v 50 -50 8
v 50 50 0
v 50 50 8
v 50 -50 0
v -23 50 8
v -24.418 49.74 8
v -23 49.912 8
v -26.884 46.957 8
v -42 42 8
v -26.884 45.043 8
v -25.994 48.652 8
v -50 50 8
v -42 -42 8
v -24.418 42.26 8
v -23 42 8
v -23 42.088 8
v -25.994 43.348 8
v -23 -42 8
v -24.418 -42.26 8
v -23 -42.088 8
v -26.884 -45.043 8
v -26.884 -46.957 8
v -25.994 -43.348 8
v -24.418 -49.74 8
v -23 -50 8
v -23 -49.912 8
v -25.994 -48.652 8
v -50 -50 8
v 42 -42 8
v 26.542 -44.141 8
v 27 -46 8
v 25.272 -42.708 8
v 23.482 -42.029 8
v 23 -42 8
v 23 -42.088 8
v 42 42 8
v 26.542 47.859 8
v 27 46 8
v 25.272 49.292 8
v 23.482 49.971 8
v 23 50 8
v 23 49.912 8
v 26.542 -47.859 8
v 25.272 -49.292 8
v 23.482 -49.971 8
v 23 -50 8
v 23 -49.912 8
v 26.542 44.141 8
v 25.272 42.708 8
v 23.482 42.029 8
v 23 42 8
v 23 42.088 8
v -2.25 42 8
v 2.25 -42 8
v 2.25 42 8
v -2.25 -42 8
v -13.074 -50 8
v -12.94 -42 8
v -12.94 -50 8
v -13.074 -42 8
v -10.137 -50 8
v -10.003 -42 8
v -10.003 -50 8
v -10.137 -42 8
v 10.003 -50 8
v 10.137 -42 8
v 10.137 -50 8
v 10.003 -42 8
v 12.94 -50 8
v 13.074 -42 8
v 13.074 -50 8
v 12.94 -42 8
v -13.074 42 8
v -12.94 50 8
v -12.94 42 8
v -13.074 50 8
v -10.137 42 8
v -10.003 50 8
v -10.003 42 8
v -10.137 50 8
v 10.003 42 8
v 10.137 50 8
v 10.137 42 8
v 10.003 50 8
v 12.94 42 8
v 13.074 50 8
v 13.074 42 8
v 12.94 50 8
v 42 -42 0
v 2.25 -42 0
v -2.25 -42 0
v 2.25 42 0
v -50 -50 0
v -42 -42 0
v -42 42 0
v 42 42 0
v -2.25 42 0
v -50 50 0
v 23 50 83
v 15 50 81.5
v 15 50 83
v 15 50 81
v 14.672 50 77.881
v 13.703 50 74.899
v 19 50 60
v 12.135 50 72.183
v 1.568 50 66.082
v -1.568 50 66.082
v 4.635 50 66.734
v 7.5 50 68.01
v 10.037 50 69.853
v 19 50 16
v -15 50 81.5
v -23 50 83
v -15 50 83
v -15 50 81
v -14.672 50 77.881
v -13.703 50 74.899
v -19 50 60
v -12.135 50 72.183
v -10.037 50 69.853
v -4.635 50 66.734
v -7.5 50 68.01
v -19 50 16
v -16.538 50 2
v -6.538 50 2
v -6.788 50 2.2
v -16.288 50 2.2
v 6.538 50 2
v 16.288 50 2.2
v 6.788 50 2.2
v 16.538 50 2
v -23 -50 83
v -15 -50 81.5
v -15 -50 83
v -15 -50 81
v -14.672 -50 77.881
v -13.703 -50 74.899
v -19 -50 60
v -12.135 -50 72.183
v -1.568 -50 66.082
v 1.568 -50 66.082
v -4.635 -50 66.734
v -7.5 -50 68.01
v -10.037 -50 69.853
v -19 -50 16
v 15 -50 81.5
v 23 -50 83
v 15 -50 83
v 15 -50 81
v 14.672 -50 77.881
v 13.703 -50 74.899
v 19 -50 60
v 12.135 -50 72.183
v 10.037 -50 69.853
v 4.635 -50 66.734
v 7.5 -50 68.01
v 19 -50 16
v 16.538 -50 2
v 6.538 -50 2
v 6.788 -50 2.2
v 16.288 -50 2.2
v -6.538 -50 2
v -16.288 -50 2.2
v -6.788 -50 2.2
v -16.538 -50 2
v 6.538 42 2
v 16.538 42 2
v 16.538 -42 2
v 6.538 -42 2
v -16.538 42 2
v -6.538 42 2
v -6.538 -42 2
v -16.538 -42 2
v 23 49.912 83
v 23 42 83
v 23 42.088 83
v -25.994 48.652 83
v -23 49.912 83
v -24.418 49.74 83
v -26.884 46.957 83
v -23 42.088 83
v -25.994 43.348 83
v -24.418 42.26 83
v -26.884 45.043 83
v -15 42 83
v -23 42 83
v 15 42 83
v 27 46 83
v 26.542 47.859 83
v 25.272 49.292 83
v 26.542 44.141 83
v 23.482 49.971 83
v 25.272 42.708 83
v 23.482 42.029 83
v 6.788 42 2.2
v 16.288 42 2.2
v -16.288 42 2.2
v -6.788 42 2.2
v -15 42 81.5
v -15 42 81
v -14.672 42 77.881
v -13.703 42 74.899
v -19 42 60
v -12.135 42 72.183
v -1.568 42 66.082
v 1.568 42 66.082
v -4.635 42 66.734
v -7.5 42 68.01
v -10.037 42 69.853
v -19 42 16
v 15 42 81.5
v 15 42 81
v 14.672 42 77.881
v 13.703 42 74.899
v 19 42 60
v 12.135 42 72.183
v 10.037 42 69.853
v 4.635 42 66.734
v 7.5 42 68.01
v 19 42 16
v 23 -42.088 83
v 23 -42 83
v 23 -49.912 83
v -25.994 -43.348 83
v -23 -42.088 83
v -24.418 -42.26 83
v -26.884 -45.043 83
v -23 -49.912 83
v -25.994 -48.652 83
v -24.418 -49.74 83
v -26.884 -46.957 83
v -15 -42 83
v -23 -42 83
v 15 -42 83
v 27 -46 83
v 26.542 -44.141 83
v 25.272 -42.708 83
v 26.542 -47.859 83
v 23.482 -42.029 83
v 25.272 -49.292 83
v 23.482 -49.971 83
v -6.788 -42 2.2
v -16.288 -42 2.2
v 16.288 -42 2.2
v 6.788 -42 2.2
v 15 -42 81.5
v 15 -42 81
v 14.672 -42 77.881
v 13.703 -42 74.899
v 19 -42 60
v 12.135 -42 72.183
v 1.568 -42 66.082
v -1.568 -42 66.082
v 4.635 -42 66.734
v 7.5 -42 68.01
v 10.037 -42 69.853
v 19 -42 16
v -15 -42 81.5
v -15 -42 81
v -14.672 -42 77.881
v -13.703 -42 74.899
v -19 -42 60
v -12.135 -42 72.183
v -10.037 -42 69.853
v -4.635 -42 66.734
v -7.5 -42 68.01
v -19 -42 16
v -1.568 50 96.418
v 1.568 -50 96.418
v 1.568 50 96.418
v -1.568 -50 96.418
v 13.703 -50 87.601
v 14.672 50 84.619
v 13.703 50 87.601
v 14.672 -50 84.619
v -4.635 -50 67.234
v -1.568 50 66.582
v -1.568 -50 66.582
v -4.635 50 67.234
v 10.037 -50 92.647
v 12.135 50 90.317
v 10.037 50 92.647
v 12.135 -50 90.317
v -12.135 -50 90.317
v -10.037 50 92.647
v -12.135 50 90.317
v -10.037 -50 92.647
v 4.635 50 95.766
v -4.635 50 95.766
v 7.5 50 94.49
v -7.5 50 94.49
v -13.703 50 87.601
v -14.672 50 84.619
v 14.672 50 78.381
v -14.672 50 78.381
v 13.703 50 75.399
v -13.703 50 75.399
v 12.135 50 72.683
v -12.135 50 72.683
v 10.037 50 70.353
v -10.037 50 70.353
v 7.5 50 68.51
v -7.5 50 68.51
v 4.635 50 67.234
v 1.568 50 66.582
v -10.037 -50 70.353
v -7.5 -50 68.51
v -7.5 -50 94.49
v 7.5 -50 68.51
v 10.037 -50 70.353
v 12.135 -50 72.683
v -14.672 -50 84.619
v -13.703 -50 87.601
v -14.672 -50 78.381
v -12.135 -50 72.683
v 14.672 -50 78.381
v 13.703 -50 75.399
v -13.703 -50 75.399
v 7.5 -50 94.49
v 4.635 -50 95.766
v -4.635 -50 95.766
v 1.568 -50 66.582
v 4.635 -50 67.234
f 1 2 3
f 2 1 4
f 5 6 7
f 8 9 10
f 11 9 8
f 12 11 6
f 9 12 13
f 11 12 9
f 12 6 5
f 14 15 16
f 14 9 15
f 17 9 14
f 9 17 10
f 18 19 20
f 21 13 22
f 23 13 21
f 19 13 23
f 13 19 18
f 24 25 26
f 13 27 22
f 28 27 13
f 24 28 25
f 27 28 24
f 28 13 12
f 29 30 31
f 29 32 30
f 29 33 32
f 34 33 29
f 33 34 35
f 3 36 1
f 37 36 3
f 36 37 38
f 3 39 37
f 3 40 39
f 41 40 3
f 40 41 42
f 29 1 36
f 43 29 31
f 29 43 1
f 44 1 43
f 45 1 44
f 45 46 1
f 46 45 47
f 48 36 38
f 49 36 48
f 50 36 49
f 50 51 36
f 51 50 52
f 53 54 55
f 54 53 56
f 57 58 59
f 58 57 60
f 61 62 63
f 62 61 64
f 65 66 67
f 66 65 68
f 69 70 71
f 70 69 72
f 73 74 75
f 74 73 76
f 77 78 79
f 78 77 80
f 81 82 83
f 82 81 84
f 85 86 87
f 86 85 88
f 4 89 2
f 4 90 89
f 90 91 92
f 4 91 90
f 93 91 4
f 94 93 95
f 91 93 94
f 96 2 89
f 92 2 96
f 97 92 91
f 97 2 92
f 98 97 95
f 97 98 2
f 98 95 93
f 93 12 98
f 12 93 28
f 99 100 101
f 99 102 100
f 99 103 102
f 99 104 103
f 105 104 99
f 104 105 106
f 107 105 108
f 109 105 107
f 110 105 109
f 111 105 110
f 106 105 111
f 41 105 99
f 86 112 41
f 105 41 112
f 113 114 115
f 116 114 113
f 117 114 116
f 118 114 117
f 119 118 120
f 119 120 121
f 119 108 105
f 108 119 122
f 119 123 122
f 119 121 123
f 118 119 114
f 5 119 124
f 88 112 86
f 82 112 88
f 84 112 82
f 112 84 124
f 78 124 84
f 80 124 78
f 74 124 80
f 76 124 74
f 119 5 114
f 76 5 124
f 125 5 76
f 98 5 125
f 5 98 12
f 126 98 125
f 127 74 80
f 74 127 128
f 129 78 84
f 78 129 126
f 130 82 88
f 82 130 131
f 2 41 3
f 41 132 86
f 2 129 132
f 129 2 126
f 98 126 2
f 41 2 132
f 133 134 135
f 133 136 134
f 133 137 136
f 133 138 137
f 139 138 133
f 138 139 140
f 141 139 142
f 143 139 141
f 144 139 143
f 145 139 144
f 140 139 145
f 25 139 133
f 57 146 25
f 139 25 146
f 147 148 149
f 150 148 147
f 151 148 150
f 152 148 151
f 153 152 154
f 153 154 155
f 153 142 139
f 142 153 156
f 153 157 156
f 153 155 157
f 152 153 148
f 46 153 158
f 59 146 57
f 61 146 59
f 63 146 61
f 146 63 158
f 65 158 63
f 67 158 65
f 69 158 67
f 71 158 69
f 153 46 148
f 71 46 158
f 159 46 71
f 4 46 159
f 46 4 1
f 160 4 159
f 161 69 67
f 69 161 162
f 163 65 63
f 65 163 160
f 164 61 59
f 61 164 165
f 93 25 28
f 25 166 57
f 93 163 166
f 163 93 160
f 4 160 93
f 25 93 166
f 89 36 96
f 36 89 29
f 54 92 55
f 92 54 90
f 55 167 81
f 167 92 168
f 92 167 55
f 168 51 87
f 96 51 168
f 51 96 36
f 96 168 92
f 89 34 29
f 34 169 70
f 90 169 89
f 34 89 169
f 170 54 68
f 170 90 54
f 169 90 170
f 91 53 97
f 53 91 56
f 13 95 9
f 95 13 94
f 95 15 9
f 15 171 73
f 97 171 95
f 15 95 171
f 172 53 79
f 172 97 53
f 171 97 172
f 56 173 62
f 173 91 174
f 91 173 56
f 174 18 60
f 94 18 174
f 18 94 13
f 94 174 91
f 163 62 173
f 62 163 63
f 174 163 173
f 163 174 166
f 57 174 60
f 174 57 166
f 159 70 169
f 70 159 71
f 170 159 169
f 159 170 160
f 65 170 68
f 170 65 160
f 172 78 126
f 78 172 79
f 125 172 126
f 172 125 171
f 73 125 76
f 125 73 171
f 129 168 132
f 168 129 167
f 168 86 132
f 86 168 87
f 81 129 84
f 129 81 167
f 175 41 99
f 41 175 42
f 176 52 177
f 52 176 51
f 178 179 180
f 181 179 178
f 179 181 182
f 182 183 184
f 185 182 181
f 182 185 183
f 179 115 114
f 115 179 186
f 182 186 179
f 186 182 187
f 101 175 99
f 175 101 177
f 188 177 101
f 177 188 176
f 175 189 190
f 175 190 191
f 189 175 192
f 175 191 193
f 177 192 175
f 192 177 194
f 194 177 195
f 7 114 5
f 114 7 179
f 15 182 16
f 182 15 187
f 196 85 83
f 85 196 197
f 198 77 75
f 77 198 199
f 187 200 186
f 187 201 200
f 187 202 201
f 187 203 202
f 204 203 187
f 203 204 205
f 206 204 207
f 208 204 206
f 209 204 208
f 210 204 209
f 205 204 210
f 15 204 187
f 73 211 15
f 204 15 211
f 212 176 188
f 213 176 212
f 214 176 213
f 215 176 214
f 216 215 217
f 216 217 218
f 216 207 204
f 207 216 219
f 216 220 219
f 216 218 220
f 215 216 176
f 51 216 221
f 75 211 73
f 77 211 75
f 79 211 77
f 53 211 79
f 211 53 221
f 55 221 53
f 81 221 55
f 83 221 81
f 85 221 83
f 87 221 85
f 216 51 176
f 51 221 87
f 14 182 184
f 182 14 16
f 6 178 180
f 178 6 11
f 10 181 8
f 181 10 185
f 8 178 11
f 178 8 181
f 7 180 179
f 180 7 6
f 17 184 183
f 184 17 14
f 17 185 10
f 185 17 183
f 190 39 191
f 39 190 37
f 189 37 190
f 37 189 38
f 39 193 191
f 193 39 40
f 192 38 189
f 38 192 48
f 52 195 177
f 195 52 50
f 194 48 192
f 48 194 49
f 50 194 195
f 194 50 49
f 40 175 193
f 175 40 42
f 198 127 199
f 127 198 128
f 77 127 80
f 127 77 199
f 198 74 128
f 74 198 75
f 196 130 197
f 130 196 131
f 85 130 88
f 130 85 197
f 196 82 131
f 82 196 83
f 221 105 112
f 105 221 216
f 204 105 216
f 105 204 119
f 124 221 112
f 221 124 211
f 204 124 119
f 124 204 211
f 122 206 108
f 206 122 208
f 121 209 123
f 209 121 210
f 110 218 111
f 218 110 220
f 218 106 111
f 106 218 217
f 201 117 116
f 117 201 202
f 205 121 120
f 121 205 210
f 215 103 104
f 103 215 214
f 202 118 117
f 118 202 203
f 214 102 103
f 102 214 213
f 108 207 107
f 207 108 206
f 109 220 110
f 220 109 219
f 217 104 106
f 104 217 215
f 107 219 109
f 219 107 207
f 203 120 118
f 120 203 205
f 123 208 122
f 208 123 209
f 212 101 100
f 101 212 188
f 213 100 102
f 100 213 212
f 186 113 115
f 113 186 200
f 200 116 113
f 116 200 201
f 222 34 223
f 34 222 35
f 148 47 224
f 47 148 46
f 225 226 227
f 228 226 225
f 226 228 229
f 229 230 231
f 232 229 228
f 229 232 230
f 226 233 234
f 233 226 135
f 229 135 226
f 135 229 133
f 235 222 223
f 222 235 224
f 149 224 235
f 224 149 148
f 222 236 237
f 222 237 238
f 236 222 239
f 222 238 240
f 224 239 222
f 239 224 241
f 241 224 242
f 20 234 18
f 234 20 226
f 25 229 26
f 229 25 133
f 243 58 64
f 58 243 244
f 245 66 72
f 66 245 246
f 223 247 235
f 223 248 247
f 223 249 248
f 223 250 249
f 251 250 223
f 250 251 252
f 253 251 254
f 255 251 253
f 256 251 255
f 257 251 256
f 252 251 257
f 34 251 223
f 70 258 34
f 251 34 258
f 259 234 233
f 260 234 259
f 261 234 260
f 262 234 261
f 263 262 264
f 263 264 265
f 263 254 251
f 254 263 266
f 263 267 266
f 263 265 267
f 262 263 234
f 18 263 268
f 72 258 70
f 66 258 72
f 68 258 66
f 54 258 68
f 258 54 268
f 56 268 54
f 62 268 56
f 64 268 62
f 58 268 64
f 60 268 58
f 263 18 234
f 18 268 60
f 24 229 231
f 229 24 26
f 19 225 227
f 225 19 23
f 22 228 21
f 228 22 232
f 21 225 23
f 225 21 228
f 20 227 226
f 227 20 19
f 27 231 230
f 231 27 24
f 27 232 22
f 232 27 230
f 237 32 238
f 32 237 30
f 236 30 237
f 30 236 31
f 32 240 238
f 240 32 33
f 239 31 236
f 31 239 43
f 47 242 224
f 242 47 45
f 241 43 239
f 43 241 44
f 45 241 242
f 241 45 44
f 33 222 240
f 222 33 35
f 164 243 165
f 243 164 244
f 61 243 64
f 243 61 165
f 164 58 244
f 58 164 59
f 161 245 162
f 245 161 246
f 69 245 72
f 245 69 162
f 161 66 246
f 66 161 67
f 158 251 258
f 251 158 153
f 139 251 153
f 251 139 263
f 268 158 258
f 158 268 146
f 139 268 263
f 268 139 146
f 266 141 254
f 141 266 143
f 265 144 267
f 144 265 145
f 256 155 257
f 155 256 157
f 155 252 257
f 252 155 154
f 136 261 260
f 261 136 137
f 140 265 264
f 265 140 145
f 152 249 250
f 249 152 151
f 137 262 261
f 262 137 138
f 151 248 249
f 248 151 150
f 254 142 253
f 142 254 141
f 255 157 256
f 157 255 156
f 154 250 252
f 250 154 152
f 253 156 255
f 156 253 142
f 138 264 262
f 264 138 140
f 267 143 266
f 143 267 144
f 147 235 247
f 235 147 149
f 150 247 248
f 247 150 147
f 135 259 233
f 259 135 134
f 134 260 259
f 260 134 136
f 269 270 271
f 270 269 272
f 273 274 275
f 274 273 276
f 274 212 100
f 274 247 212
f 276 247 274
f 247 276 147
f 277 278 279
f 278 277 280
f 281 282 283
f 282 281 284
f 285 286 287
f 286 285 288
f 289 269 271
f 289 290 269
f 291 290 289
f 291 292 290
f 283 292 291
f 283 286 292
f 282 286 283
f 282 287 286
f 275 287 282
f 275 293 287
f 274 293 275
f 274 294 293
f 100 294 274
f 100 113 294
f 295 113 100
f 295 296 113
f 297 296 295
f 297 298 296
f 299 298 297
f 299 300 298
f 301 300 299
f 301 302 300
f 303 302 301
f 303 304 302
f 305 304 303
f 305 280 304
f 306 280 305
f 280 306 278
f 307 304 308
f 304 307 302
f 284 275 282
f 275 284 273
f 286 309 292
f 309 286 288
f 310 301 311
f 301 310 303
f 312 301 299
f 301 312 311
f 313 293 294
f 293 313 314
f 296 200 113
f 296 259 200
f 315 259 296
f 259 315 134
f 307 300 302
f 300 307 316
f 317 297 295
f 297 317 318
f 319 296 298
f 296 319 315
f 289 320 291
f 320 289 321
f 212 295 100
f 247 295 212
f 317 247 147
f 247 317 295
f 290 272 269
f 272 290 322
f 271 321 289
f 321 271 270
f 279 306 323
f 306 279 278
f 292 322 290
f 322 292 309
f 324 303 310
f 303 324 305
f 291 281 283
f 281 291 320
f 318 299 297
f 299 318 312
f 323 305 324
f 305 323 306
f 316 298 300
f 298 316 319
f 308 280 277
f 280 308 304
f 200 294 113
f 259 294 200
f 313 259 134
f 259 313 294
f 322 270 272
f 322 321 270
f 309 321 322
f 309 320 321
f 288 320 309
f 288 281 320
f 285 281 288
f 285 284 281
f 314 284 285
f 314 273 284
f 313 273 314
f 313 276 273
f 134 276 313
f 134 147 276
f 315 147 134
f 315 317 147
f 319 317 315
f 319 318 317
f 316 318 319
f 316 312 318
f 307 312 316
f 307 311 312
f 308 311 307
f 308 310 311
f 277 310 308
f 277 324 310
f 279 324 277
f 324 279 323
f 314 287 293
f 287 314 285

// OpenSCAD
/**
 * Parametric Spool Holder
 * By Chris London
 * 
 * based on: http://www.thingiverse.com/thing:293623
 */

/* [Standard] */
/* [Global] */

// Which part would you like to see?
part = "all"; // [axle:Axle Only,stands:Stands Only,base:Base Only,all:All]

// The diameter of the hole in the center of the spool in millimeters.
axle_diameter = 32;

// The diameter of the entire spool in millimeters
spool_diameter = 100;

// The width of the spool in millimeters
spool_width = 60;


/* [Advanced] */

// Extra space between the axle and the spool opening in millimeters
axle_tolerance = 2;

// Extra space from the spool to the ground in millimeters
spool_tolerance = 25;

// Extra space between the stands and the spool in millimeters
spool_padding = 20;

// Thickness of the design in millimeters
stand_thickness = 8;

// Extra base width for stability in millimeters
stand_balance = 68;

/* [Hidden] */

axleRadius =  (axle_diameter - axle_tolerance) / 2;
spoolRadius = spool_diameter / 2 + spool_tolerance;
standWidth = spool_width + (2 * spool_padding);
pegDistance = (axleRadius / 1.3) > 8 ? axleRadius / 1.3 : 8;

print_part();

module print_part() {
	if (part == "axle") {
		axle();
	} else if (part == "stands") {
		flatStands();
	} else if (part == "base") {
		base();
	} else if (part == "all") {
		all();
	} else {
		all();
	}
}

// Draw the base
module base() {
	difference() {
		translate([-(stand_balance + axle_diameter) / 2, -standWidth / 2, 0]) 
		cube([stand_balance + axle_diameter, standWidth, stand_thickness]);

		translate([2.25, -standWidth / 2 + stand_thickness, -stand_thickness / 2])
		cube([(stand_balance + axle_diameter) / 2 - stand_thickness - 2.25, standWidth - stand_thickness * 2, stand_thickness * 2]);

		translate([-(stand_balance + axle_diameter) / 2 + stand_thickness, -standWidth / 2 + stand_thickness, -stand_thickness / 2])
		cube([(stand_balance + axle_diameter) / 2 - stand_thickness - 2.25, standWidth - stand_thickness * 2, stand_thickness * 2]);

		translate([-pegDistance, -41, 2])
		equiTriangle([10, stand_thickness * 2]);

		translate([pegDistance, -41, 2])
		equiTriangle([10, stand_thickness * 2]);

		translate([-pegDistance, 51, 2])
		equiTriangle([10, stand_thickness * 2]);

		translate([pegDistance, 51, 2])
		equiTriangle([10, stand_thickness * 2]);
	}
}

// Draw two stands in their upright position
module stands() {
	translate([0, standWidth / 2 - stand_thickness / 2, 0])
	stand();

	translate([0, -standWidth / 2 + stand_thickness / 2, 0])
	stand();
}

// Draw two stands in their flat printing position
module flatStands() {
	translate([-(axleRadius + stand_thickness) - 10, 0, 0])
	rotate(90, v=[1,0,0])
	stand();

	translate([(axleRadius + stand_thickness) + 10, 0, 0])
	rotate(90, v=[1,0,0])
	stand();
}

// Draw a single stand in an upright position
module stand() {
	pegOffset = -5.8;

	difference() {
		translate([0, 0, stand_thickness]) union() {
			translate([-(axleRadius + stand_thickness), -stand_thickness / 2, 0]) 
			cube([(axleRadius + stand_thickness) * 2, stand_thickness, spoolRadius]);

			translate([-(axleRadius + stand_thickness), 0, 0]) 
			cylinder(spoolRadius, stand_thickness / 2, stand_thickness / 2);

			translate([(axleRadius + stand_thickness), 0, 0])
			cylinder(spoolRadius, stand_thickness / 2, stand_thickness / 2);

			translate([-pegDistance, stand_thickness / 2, pegOffset])
			equiTriangle([9.5, stand_thickness]);

			translate([pegDistance, stand_thickness / 2, pegOffset])
			equiTriangle([9.5, stand_thickness]);
		}

		translate([-axleRadius - stand_thickness / 2, -stand_thickness, stand_thickness * 2]) 
		cube([axleRadius * 2 + stand_thickness, stand_thickness * 2, spoolRadius - axleRadius - (stand_thickness * 2)]);

		rotate(90, v=[1,0,0])
		translate([0, spoolRadius + stand_thickness - 2, -stand_thickness])
		cylinder(stand_thickness * 2, axleRadius, axleRadius);

		translate([-axleRadius, -stand_thickness, spoolRadius + stand_thickness - 2])	
		cube([axleRadius * 2, stand_thickness * 2, axleRadius * 2]);
	}
}

// Draw an axle in the upright position
module axle() {
	cylinder(standWidth, axleRadius, axleRadius);
}

module all() {
	base();
	stands();

	rotate(90, v=[1,0,0])
	translate([0, spoolRadius + stand_thickness - 1.5, -standWidth / 2])
	axle();
}

module equiTriangle(coords) {
	height = coords[0] / 2 * sqrt(3);
	rotate(90, v=[1,0,0]) 
	linear_extrude(coords[1], true, coords[1], 0)
	polygon(points=[[0,height], [-coords[0]/2, 0], [coords[0]/2, 0]]);
}
